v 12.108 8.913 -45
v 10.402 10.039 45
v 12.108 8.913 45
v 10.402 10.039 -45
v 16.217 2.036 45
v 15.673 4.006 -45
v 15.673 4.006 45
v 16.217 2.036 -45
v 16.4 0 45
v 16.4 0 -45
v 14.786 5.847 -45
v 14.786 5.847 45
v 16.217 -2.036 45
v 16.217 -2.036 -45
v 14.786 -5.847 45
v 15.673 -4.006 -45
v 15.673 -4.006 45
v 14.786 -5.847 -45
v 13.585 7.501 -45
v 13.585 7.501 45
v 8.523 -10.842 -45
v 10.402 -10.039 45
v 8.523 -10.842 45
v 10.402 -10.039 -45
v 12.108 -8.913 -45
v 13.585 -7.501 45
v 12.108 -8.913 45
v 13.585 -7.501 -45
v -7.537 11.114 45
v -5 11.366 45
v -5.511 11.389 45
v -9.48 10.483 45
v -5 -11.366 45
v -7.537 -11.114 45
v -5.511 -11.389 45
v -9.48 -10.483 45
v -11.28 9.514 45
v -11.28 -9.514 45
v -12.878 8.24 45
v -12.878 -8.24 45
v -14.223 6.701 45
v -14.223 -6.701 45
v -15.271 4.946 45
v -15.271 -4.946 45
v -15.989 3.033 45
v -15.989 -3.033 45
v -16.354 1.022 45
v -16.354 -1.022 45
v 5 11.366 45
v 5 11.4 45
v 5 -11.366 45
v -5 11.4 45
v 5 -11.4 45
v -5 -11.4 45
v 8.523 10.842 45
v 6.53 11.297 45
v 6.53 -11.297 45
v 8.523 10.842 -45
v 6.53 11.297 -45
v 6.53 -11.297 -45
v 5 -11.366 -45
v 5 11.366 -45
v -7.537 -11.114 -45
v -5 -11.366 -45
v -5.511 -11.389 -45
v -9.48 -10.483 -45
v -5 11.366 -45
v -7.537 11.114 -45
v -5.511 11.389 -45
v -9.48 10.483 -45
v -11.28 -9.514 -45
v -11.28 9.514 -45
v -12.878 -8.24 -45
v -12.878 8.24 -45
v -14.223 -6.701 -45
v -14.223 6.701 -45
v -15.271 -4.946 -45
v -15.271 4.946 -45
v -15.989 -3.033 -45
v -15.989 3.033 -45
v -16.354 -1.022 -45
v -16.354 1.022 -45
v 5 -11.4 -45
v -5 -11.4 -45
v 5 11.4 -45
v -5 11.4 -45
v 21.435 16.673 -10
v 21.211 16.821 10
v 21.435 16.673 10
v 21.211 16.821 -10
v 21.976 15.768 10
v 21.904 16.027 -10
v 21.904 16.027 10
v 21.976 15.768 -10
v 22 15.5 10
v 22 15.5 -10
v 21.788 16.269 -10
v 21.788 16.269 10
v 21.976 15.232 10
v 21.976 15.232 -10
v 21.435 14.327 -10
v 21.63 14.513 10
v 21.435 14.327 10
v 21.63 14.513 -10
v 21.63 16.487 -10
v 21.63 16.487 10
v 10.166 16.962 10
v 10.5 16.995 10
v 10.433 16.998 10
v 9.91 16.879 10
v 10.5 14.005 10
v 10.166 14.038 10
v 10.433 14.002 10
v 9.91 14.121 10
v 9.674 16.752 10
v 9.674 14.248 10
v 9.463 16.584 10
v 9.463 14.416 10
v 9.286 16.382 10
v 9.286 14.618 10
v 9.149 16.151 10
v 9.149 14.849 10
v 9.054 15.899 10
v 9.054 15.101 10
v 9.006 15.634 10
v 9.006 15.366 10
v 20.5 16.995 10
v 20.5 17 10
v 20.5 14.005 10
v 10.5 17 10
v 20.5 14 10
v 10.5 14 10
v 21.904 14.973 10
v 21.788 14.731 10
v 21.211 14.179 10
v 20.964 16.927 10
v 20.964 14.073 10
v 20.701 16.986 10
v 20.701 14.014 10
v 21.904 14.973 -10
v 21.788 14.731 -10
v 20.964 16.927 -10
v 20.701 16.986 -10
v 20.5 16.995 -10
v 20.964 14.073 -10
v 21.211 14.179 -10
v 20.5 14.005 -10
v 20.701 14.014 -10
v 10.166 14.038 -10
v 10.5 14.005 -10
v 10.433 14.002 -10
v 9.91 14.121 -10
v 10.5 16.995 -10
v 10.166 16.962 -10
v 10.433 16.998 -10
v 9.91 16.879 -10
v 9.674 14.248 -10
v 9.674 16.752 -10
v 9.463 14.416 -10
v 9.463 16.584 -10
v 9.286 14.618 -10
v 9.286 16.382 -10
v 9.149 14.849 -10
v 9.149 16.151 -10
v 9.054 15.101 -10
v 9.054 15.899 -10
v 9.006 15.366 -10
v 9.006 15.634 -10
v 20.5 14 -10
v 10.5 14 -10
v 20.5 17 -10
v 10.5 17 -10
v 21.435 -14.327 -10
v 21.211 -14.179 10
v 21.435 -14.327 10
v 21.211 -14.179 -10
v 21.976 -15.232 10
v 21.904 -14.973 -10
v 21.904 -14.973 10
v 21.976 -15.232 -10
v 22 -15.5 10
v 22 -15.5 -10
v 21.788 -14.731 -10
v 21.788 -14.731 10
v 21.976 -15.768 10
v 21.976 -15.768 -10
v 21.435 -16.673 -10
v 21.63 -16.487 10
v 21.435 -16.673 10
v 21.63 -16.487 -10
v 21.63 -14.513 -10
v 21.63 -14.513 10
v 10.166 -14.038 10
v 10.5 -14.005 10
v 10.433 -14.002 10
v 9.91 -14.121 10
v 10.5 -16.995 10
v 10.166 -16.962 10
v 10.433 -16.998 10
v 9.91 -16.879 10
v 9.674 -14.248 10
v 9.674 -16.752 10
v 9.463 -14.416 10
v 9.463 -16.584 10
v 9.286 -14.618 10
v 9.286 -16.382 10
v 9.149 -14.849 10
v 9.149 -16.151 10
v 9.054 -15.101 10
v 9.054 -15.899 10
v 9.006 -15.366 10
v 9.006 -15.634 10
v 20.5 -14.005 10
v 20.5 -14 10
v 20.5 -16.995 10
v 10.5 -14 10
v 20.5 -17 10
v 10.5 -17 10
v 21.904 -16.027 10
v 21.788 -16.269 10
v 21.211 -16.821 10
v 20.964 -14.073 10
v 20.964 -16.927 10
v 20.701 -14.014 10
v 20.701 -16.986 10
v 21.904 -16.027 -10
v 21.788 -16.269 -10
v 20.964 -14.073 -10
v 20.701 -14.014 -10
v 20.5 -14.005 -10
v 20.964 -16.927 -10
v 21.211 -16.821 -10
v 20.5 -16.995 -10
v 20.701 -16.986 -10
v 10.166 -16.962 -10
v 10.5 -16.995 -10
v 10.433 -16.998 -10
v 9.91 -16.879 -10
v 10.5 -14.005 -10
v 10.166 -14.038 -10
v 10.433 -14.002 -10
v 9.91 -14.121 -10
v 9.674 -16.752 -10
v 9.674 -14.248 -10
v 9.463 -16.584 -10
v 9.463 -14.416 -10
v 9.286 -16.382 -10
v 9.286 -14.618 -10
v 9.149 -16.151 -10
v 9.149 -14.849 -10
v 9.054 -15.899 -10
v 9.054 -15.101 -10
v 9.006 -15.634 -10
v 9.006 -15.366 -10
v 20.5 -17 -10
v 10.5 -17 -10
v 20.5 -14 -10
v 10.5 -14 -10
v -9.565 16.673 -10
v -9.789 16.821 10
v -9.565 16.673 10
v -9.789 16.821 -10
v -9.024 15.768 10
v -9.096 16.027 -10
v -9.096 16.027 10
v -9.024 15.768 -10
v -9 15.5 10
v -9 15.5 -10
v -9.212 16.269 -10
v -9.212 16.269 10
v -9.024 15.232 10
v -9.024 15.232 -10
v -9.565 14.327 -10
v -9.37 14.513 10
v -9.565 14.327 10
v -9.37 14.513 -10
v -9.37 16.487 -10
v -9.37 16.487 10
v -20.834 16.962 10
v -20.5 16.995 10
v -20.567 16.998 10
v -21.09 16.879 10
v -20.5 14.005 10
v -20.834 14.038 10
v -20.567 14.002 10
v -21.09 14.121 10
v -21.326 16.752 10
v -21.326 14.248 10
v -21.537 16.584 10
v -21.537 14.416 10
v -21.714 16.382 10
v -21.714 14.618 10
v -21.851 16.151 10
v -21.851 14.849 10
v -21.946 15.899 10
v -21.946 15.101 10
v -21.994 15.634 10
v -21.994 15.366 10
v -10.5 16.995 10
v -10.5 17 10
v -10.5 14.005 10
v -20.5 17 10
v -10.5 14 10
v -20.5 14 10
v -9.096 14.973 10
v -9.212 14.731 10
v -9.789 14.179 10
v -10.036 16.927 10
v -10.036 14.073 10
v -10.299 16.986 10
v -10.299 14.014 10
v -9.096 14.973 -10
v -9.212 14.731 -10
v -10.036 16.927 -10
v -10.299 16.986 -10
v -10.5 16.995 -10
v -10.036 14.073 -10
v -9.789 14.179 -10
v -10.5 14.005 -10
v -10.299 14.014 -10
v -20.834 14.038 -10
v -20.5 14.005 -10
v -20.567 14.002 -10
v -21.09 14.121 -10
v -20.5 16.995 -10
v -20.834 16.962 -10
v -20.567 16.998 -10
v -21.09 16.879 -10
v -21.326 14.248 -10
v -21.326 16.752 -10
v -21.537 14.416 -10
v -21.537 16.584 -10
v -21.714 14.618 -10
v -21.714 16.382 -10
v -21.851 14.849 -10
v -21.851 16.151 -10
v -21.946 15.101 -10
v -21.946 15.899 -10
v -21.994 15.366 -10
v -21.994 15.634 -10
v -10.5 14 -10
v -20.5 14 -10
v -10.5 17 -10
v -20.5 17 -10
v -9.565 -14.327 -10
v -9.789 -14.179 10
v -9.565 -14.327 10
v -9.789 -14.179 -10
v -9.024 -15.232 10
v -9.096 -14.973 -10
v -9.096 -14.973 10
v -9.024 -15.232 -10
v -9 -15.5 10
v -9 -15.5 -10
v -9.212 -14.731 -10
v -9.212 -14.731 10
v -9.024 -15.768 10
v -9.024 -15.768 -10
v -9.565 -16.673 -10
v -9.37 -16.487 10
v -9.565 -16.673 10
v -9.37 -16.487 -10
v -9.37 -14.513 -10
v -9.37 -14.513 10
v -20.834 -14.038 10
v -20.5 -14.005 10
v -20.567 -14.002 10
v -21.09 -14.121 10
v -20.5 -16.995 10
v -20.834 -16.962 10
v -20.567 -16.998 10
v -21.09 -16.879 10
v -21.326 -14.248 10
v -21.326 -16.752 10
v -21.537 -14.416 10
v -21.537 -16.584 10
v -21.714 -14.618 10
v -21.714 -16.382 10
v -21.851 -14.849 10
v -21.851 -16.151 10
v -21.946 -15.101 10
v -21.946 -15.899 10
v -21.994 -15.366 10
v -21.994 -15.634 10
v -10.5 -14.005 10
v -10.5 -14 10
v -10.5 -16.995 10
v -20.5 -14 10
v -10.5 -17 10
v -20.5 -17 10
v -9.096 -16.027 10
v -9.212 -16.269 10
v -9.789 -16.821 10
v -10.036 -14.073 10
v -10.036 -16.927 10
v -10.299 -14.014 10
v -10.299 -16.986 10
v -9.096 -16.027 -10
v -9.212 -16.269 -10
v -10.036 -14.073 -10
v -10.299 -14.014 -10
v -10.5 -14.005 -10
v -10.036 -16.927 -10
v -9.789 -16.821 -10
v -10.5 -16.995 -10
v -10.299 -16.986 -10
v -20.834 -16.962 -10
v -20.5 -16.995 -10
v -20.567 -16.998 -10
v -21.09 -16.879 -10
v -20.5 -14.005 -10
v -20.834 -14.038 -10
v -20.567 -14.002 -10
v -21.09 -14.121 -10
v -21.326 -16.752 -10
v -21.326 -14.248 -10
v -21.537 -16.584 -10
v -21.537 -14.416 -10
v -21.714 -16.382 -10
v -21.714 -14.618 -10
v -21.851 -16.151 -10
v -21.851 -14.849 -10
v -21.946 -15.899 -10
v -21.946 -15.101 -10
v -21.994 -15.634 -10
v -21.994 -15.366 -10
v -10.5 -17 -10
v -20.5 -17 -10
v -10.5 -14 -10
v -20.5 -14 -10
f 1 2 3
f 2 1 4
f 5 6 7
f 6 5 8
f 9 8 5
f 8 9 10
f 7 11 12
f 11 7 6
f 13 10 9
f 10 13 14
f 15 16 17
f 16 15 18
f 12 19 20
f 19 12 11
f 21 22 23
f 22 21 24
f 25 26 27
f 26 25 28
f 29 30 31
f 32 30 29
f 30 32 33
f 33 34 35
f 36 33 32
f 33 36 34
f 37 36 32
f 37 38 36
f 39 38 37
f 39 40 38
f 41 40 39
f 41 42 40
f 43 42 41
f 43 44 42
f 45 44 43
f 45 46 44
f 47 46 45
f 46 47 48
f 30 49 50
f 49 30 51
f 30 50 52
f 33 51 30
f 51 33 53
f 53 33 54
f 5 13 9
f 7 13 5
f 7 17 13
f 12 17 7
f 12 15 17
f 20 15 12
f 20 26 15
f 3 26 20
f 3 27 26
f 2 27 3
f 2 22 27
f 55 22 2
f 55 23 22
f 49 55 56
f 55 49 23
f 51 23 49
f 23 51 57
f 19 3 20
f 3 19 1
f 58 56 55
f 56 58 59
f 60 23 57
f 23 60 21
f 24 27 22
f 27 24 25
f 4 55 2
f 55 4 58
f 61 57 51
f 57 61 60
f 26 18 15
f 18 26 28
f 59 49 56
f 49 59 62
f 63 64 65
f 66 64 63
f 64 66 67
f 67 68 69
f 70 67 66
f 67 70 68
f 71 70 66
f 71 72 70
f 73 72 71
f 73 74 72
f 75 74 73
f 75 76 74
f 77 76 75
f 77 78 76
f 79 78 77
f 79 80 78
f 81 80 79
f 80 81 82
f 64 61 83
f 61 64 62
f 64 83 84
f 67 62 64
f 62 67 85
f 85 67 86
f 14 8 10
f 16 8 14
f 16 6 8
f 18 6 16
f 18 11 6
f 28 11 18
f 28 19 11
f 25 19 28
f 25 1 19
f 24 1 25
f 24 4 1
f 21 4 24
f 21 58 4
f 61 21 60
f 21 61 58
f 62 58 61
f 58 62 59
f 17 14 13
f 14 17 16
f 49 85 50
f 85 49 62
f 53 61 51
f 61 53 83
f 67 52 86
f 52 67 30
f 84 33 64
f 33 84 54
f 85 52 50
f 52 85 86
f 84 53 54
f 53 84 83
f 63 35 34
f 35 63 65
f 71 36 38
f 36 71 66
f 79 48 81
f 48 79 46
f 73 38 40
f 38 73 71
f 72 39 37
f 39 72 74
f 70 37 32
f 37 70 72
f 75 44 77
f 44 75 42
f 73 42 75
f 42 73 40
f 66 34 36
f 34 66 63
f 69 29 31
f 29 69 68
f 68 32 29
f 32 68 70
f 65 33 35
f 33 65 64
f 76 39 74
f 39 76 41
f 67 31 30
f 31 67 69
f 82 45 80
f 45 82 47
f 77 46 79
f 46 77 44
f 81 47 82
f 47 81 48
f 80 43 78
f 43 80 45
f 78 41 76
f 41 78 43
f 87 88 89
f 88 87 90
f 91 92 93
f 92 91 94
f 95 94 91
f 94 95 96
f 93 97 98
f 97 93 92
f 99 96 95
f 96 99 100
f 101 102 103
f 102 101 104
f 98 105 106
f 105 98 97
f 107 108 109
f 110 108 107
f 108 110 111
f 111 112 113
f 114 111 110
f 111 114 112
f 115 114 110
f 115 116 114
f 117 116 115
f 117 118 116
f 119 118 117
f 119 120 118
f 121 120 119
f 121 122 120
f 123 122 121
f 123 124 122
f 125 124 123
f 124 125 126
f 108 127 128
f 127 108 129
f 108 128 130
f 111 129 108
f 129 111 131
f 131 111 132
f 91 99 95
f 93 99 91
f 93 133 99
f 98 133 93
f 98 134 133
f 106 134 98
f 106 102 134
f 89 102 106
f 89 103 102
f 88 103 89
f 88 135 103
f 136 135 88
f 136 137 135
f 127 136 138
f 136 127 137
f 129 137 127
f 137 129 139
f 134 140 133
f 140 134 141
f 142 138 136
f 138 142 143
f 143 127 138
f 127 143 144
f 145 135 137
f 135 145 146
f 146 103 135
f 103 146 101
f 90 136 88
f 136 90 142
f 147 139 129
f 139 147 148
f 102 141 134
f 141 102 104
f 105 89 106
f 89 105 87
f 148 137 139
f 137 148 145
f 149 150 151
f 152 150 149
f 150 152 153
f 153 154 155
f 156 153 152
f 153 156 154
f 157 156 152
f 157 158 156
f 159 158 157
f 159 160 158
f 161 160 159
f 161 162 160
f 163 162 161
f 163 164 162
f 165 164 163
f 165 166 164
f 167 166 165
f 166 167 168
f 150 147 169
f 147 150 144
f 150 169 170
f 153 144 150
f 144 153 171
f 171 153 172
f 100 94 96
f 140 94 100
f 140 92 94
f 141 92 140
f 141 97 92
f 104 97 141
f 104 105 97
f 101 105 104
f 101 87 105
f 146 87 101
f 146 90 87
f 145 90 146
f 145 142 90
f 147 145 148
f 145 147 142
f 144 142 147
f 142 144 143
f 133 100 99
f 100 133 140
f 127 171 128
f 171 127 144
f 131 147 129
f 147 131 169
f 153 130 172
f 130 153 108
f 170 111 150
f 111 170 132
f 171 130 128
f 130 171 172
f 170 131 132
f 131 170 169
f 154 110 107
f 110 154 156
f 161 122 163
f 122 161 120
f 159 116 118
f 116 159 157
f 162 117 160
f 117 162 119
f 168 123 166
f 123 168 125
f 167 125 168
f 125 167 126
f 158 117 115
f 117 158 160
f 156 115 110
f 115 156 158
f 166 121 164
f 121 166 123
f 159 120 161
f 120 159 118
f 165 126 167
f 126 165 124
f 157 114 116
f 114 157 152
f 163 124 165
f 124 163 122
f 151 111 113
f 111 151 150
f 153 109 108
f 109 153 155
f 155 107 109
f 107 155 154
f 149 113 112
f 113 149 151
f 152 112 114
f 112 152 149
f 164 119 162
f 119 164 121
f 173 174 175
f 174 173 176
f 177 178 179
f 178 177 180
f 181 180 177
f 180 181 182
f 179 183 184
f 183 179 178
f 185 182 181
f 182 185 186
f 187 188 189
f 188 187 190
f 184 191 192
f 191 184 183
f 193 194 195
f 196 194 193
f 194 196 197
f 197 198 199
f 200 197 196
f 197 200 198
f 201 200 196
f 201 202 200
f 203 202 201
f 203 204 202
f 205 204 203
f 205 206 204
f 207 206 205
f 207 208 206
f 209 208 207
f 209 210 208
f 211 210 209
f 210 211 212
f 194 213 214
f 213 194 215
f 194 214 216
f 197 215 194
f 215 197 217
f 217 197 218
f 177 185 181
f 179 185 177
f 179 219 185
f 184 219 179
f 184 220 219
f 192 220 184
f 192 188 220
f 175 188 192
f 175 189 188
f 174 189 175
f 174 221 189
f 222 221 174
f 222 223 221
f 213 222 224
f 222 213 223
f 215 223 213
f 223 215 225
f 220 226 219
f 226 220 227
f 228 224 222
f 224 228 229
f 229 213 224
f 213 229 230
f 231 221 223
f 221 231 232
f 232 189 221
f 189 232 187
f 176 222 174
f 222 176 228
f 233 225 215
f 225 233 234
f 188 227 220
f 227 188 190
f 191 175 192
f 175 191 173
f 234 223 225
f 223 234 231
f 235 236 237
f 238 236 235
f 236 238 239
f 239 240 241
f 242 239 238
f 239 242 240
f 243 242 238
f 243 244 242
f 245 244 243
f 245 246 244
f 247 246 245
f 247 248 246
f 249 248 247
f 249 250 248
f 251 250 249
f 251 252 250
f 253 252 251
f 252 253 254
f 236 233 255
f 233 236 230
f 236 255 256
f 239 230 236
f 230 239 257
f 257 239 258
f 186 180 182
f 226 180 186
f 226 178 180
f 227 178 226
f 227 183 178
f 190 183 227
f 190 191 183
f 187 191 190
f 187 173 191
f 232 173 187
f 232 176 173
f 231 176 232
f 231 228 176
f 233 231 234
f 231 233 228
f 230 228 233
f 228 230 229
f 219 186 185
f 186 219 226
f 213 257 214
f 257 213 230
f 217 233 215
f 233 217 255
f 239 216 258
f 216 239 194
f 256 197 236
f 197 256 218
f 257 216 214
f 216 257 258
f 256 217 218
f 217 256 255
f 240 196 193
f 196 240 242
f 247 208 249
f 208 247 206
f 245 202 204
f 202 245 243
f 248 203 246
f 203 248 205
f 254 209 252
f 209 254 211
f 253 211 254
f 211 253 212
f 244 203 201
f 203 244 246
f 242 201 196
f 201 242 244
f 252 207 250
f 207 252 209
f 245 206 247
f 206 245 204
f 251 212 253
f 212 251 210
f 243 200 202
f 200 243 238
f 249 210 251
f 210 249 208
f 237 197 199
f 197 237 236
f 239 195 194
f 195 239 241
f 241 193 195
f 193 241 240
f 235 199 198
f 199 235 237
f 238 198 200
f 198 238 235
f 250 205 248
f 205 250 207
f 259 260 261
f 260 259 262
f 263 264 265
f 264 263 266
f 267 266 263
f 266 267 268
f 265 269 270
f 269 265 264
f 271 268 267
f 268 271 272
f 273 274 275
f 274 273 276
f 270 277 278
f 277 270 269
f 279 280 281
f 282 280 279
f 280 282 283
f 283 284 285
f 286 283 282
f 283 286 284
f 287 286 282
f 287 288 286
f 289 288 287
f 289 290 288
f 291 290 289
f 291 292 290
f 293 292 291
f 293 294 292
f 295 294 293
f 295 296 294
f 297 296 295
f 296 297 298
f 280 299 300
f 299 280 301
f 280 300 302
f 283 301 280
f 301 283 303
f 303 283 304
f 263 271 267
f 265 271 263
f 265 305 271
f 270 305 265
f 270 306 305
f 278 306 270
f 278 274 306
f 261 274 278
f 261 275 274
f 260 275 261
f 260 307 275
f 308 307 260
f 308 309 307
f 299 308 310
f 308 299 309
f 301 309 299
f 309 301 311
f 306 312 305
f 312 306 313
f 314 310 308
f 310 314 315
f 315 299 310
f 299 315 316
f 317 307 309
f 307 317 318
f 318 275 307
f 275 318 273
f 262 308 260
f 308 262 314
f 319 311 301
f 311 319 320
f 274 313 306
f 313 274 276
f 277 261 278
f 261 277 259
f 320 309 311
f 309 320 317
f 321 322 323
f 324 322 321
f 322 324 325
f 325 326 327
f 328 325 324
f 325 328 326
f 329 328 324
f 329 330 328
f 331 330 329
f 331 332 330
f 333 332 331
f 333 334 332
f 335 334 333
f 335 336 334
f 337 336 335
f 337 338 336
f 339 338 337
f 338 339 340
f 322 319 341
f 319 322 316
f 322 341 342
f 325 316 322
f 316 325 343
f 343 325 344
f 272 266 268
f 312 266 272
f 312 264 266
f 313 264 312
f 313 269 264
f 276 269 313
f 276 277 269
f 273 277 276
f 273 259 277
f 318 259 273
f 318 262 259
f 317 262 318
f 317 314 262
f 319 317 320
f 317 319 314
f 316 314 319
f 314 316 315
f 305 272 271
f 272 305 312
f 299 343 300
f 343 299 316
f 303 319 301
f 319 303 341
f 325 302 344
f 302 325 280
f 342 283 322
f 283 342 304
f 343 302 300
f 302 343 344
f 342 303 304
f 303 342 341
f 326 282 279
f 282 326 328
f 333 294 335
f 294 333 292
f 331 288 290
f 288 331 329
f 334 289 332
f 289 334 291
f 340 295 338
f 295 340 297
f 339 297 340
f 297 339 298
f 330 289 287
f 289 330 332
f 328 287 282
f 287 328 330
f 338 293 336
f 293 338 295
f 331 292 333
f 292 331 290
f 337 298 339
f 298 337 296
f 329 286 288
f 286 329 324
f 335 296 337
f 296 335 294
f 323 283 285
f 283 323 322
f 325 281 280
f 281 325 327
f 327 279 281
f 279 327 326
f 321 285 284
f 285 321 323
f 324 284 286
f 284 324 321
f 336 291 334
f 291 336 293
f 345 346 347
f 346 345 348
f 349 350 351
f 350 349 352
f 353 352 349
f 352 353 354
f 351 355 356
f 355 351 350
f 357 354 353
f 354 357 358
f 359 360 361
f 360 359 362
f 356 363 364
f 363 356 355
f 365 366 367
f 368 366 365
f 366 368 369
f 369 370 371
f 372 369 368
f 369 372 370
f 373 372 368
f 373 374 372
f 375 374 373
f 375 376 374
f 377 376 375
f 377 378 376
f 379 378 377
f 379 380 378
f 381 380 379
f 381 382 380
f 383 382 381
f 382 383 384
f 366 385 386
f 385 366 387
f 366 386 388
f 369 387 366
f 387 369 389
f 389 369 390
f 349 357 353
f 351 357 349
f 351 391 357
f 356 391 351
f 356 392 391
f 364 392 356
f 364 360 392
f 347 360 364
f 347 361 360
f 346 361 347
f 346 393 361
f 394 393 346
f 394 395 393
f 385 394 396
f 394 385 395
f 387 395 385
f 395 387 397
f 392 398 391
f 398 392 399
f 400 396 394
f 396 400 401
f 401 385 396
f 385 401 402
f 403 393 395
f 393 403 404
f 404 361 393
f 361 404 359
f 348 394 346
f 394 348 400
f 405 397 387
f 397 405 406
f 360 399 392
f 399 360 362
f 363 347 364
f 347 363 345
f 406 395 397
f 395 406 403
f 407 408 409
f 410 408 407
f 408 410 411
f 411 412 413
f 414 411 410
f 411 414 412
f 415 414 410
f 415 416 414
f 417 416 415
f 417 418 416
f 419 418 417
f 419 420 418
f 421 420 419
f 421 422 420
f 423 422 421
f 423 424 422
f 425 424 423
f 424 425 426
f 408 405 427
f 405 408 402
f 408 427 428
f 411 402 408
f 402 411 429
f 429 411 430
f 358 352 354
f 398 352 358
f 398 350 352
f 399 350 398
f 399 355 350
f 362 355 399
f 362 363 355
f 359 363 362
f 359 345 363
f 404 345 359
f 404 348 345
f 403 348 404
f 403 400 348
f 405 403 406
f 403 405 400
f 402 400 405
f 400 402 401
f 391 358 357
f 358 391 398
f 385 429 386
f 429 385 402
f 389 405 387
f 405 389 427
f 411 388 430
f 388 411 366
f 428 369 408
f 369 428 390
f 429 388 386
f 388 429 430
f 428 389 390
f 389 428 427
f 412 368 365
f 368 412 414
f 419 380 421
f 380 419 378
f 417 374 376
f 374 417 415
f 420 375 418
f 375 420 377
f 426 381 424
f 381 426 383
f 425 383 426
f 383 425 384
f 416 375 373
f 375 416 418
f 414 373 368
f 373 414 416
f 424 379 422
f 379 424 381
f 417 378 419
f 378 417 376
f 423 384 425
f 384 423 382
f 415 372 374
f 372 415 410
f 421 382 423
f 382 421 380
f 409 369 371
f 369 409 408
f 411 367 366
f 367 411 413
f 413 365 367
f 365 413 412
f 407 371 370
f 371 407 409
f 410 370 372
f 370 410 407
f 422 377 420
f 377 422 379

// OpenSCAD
// file: constants.scad
nemaoffset=15;
nemaholedistance=31;
nemahole=22.8;
$fn=35;
m3=3;
zRodSpread=80;
m3borehole=2.7;
lmu8width=15.4;
lmu8len=24;
bearingthickness=8;
bearingod=10;
beltthickness=1.4;
beltwidth=6;
608width=22;
608thick=7;
rodHole=8.2;
extrusion=15;
extrusionFudge=.2;
extrusionLength=400;
wall=5;
pulleyWidth=608width+beltthickness*3;
pulleyHeight=lmu8width+wall;
gt2pulleydia=10;
m8washerthickness=1.6;
yslideWidth=lmu8width+wall;
yBlockLen=lmu8len*3+wall;
xRodSpread=yBlockLen-wall*4;
// main file
include <constants.scad>

module roundedslot(length, width, h) {
	translate([length/2, 0, 0]) cylinder(d=width, h=h, center=true);
	cube([length, width, h], center=true);
	translate([-length/2, 0, 0]) cylinder(d=width, h=h, center=true);
}

module nema17Holes(h=15, slot=false, slength=10, angle=0)
{
	if(slot == true) {

		rotate([0,0,angle]) roundedslot(slength,nemahole,90);
		for(shiftx=[nemaholedistance/2, -nemaholedistance/2], shifty=[nemaholedistance/2, -nemaholedistance/2]) {
			translate([shiftx, shifty, 0]) rotate([0,0,angle]) roundedslot(slength, m3, h);
		}			
	} else {
		cylinder(d=nemahole, h=h, center=true);
		for(shiftx=[nemaholedistance/2, -nemaholedistance/2], shifty=[nemaholedistance/2, -nemaholedistance/2]) {
			translate([shiftx, shifty, 0]) cylinder(d=3, h=h, center=true);
		}
	}
}

module nema17faceplate(x,y,z, slot=false)
{
	xoffset = (x-nemaholedistance)/2;
	yoffset=(y-nemaholedistance)/2;
	echo (xoffset);
	echo (yoffset);
	difference() {
		cube([x, y, z]);
		if(slot == true) {
			translate([x/2 -3, y/2, -5]) cylinder(d=nemahole, h=15);
			translate([x/2, y/2, z/2]) cube([6,nemahole, 15], center=true);
			translate([x/2 +3, y/2, -5]) cylinder(d=nemahole, h=15);

		} else {
			translate([x/2, y/2, -5]) cylinder(d=nemahole, h=15);
		}
		for(shiftx=[xoffset, x-xoffset], shifty=[yoffset,y-yoffset]) {
			if(slot == true) {
				translate([shiftx-3, shifty, -5]) cylinder(r=1.6, h=20, $fn=20);
				translate([shiftx+3, shifty, -5]) cylinder(r=1.6, h=20, $fn=20);
				#translate([shiftx, shifty, 0]) cube([6, 1.6*2, z+10], center=true);
			}
			else
			#translate([shiftx, shifty, -5]) cylinder(r=1.6, h=20, $fn=20);
		} 
	}
}

nema17Holes(20, true);
